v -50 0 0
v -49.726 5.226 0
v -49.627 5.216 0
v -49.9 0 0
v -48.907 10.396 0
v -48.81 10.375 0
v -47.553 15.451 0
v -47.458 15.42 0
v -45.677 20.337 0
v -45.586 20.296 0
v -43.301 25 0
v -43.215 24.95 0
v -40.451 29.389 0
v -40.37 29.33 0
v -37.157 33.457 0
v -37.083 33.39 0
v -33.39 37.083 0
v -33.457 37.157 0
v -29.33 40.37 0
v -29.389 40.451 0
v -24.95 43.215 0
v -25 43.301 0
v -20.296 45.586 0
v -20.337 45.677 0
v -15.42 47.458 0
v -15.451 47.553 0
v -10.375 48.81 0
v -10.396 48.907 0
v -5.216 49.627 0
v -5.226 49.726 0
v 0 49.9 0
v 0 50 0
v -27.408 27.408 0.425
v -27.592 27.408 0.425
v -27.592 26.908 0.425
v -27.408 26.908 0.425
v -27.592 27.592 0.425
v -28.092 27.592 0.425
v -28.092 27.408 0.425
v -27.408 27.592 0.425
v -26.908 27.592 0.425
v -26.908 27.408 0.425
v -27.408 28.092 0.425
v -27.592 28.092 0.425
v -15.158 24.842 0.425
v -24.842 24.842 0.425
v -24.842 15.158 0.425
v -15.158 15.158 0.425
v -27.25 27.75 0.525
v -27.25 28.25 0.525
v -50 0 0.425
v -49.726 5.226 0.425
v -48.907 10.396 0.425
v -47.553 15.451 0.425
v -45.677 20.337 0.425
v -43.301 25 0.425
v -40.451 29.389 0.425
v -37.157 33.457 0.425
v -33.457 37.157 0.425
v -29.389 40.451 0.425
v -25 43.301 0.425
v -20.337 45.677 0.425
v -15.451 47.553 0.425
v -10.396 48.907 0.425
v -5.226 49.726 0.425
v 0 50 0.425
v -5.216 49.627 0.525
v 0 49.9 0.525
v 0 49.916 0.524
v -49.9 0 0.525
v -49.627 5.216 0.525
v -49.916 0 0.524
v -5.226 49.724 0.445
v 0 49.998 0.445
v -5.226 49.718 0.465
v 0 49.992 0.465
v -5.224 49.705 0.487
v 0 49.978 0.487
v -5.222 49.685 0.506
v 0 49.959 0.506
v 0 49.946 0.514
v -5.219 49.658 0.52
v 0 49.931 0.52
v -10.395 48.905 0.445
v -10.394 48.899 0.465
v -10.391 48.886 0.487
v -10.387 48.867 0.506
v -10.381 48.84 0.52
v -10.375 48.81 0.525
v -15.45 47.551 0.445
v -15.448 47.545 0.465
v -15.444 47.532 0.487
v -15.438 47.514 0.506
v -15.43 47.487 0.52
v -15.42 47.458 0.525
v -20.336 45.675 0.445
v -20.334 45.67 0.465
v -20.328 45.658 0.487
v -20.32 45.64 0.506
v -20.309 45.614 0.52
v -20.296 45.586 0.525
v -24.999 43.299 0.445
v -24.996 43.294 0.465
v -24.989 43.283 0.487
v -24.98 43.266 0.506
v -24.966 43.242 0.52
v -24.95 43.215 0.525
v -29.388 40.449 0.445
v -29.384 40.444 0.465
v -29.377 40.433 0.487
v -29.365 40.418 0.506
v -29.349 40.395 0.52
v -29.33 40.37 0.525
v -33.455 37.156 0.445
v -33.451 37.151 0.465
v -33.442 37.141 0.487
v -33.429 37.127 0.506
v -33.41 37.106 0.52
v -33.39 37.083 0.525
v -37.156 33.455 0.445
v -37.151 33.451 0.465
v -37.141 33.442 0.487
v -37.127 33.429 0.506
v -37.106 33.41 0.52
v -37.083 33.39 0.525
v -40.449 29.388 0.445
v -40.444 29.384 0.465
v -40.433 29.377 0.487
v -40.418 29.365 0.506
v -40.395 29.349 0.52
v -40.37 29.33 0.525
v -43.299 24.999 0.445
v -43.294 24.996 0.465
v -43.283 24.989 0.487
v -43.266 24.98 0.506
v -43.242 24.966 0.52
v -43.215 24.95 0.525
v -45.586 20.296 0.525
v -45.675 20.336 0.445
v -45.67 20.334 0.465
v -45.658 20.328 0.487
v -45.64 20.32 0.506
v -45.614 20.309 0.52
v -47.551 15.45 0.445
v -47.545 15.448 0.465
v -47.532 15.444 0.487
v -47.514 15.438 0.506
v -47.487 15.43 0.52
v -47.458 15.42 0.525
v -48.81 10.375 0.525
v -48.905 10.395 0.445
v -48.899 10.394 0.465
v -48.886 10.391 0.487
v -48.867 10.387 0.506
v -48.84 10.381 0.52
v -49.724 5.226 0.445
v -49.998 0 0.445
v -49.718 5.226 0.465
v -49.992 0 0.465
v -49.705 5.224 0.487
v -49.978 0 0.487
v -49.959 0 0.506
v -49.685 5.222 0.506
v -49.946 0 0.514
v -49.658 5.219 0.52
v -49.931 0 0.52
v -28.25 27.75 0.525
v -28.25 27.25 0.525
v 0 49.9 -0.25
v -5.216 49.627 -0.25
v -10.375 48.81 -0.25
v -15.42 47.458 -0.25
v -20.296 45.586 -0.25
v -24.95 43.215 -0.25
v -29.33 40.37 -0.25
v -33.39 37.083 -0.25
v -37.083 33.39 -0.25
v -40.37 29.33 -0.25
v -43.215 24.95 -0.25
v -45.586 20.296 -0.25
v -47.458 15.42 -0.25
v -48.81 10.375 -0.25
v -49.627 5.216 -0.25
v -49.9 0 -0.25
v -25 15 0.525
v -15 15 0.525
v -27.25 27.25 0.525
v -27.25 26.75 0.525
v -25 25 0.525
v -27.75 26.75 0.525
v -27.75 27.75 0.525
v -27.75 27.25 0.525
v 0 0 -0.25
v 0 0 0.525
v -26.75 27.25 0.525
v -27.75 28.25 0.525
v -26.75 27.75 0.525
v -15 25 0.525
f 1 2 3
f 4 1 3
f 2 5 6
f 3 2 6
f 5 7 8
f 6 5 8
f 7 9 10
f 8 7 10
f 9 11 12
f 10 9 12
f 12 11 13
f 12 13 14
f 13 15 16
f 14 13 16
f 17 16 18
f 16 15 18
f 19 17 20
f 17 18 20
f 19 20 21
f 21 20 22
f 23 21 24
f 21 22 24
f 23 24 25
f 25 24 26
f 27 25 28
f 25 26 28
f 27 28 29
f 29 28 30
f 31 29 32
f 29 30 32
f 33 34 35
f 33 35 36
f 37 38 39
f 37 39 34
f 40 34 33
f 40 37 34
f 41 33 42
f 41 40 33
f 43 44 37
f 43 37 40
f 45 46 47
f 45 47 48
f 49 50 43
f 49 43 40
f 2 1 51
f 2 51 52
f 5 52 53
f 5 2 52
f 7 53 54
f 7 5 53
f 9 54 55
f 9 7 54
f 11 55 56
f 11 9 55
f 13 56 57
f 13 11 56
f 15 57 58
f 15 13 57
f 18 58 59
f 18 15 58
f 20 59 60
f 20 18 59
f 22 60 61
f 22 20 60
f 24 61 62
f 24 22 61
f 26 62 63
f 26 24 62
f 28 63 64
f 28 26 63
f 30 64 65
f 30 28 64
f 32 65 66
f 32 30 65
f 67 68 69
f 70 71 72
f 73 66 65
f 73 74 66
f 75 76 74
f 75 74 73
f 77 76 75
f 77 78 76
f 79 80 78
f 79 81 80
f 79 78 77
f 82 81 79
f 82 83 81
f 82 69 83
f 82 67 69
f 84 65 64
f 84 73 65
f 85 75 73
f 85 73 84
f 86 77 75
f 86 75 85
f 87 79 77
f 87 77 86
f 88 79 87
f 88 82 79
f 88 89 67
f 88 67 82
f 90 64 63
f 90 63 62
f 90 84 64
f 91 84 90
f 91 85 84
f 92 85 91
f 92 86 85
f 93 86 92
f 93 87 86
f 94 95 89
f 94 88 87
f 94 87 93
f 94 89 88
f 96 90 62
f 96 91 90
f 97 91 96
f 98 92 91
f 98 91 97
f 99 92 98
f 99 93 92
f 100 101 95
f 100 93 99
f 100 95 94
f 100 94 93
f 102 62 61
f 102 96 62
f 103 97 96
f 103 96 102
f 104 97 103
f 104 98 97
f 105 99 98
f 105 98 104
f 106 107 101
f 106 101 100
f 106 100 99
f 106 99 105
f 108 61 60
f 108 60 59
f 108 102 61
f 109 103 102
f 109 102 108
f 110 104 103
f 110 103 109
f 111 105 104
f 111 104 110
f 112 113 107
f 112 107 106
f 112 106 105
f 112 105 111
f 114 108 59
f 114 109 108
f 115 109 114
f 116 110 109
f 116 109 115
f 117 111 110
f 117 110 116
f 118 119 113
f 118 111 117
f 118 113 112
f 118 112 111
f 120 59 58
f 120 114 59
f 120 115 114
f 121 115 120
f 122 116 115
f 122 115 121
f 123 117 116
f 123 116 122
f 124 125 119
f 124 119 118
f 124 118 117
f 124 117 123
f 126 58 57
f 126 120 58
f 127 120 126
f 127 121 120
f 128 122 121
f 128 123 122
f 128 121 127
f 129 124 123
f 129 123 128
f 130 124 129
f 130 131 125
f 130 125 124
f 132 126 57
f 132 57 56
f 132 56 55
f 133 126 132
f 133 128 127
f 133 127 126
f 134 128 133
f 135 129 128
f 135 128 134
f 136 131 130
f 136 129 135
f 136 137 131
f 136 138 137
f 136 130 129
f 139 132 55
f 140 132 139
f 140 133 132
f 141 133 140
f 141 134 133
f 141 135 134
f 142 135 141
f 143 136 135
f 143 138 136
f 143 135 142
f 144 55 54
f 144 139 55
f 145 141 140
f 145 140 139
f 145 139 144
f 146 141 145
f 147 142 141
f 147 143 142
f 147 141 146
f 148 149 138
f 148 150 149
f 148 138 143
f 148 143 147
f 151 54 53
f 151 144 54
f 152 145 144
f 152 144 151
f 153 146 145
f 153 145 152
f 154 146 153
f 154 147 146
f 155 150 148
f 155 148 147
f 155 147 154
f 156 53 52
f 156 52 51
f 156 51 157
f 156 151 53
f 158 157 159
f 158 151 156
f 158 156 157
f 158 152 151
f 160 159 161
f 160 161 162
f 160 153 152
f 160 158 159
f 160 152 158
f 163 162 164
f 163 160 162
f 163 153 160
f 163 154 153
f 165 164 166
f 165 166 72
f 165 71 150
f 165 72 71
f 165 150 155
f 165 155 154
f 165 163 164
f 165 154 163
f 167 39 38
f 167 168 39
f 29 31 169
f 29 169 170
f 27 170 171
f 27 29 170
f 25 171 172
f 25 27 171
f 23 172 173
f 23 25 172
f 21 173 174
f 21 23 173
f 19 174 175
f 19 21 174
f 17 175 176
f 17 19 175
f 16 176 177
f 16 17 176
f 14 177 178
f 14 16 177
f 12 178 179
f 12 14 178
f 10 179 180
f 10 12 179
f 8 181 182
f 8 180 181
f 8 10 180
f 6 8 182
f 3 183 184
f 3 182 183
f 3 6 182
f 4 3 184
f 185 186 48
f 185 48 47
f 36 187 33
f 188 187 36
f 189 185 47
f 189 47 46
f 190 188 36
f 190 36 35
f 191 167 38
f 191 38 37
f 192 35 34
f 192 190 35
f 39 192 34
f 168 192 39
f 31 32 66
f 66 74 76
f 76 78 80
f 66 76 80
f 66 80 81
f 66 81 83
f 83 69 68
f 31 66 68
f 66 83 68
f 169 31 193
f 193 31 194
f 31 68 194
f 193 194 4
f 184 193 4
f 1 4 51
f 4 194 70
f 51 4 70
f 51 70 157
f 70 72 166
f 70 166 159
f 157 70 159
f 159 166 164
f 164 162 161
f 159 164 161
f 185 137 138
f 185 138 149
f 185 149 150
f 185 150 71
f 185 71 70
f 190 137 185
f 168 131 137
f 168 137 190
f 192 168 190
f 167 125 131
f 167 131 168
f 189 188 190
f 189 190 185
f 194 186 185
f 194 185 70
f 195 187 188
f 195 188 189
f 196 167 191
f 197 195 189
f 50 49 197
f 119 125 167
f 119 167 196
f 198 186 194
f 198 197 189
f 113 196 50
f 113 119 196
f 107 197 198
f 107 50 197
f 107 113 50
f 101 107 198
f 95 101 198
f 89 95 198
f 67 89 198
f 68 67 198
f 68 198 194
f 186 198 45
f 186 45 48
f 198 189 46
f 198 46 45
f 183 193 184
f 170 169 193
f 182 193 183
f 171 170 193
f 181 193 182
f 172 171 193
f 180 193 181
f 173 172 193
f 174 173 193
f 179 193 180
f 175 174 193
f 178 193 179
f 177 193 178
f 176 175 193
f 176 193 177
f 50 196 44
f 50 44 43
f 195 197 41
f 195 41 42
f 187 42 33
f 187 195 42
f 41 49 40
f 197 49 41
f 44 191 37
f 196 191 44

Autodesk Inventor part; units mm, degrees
ref_plane "YZ Plane" through (0, 0, 0) normal (1, 0, 0) x (0, 1, 0)
ref_plane "XZ Plane" through (0, 0, 0) normal (0, 1, 0) x (-1, 0, 0)
ref_plane "XY Plane" through (0, 0, 0) normal (0, 0, 1) x (1, 0, 0)
sketch "Sketch1" plane through (0, 0, 0) normal (0, 0, 1) x (1, 0, 0)
  line L0 (0, 0) -> (-50, 0)
  line L1 (0, 0) -> (0, 50)
  arc A0 (0, 50) -> (-50, 0) centre (0, 0) ccw
  dimension "d0" = 50
extrude "Wafer" add sketch "Sketch1" along normal blind 0.525
fillet "OutsideEdge" radius 0.1 1 edges at (-35.3553, 35.3553, 0.525)
sketch "Sketch3" plane through (0, 0, 0) normal (0, 0, -1) x (-1, 0, 0)
  line L0 (0, 50) -> (0, 0)
  arc A0 (49.9, 0) -> (0, 49.9) centre (0, 0) ccw projected
  line L1 (0, 0) -> (49.9, 0) projected
  line L2 (0, 49.9) -> (0, 0) projected
extrude "Wax" add sketch "Sketch3" along normal blind 0.25
sketch "Sketch4" plane through (0, 0, 0.525) normal (0, 0, 1) x (1, 0, 0)
  line L0 (0, 0) -> (-49.9, 0) projected
  line L1 (0, 49.9) -> (0, 0) projected
  line L2 (-24.5, 24.5) -> (-15.5, 24.5) construction
  line L3 (-15.5, 24.5) -> (-15.5, 15.5) construction
  line L4 (-15.5, 15.5) -> (-24.5, 15.5) construction
  line L5 (-24.5, 15.5) -> (-24.5, 24.5) construction
  line L6 (-24.5, 20) -> (-15.5, 20) construction
  line L7 (-20, 24.5) -> (-20, 15.5) construction
  line L8 (-25, 25) -> (-15, 25)
  line L9 (-15, 25) -> (-15, 15)
  line L10 (-15, 15) -> (-25, 15)
  line L11 (-25, 15) -> (-25, 25)
  line L12 (-20, 25) -> (-20, 24.5) construction
  line L13 (-15, 20) -> (-15.5, 20) construction
  line L14 (-27.75, 27.75) -> (-27.25, 27.75) construction
  line L15 (-27.25, 27.75) -> (-27.25, 27.25) construction
  line L16 (-27.25, 27.25) -> (-27.75, 27.25) construction
  line L17 (-27.75, 27.25) -> (-27.75, 27.75) construction
  line L18 (-27.75, 27.5) -> (-27.25, 27.5) construction
  line L19 (-27.5, 27.75) -> (-27.5, 27.25) construction
  line L20 (-27.75, 27.75) -> (-27.75, 28.25)
  line L21 (-27.75, 28.25) -> (-27.25, 28.25)
  line L22 (-27.25, 28.25) -> (-27.25, 27.75)
  line L23 (-27.25, 27.75) -> (-26.75, 27.75)
  line L24 (-26.75, 27.75) -> (-26.75, 27.25)
  line L25 (-26.75, 27.25) -> (-27.25, 27.25)
  line L26 (-27.25, 27.25) -> (-27.25, 26.75)
  line L27 (-27.25, 26.75) -> (-27.75, 26.75)
  line L28 (-27.75, 26.75) -> (-27.75, 27.25)
  line L29 (-27.75, 27.25) -> (-28.25, 27.25)
  line L30 (-28.25, 27.25) -> (-28.25, 27.75)
  line L31 (-28.25, 27.75) -> (-27.75, 27.75)
  point P0 (-20, 20)
  point P1 (-20, 20)
  point P2 (-20, 20)
  dimension "d8" = 20
  dimension "d9" = 20
  dimension "d10" = 9
  dimension "d11" = 10
  dimension "d14" = 0.5
  dimension "d15" = 2.5
  dimension "d16" = 2.5
extrude "Cutout" cut sketch "Sketch4" against normal blind 0.1 draft -57.6
properties part number "carrier-wafer"
